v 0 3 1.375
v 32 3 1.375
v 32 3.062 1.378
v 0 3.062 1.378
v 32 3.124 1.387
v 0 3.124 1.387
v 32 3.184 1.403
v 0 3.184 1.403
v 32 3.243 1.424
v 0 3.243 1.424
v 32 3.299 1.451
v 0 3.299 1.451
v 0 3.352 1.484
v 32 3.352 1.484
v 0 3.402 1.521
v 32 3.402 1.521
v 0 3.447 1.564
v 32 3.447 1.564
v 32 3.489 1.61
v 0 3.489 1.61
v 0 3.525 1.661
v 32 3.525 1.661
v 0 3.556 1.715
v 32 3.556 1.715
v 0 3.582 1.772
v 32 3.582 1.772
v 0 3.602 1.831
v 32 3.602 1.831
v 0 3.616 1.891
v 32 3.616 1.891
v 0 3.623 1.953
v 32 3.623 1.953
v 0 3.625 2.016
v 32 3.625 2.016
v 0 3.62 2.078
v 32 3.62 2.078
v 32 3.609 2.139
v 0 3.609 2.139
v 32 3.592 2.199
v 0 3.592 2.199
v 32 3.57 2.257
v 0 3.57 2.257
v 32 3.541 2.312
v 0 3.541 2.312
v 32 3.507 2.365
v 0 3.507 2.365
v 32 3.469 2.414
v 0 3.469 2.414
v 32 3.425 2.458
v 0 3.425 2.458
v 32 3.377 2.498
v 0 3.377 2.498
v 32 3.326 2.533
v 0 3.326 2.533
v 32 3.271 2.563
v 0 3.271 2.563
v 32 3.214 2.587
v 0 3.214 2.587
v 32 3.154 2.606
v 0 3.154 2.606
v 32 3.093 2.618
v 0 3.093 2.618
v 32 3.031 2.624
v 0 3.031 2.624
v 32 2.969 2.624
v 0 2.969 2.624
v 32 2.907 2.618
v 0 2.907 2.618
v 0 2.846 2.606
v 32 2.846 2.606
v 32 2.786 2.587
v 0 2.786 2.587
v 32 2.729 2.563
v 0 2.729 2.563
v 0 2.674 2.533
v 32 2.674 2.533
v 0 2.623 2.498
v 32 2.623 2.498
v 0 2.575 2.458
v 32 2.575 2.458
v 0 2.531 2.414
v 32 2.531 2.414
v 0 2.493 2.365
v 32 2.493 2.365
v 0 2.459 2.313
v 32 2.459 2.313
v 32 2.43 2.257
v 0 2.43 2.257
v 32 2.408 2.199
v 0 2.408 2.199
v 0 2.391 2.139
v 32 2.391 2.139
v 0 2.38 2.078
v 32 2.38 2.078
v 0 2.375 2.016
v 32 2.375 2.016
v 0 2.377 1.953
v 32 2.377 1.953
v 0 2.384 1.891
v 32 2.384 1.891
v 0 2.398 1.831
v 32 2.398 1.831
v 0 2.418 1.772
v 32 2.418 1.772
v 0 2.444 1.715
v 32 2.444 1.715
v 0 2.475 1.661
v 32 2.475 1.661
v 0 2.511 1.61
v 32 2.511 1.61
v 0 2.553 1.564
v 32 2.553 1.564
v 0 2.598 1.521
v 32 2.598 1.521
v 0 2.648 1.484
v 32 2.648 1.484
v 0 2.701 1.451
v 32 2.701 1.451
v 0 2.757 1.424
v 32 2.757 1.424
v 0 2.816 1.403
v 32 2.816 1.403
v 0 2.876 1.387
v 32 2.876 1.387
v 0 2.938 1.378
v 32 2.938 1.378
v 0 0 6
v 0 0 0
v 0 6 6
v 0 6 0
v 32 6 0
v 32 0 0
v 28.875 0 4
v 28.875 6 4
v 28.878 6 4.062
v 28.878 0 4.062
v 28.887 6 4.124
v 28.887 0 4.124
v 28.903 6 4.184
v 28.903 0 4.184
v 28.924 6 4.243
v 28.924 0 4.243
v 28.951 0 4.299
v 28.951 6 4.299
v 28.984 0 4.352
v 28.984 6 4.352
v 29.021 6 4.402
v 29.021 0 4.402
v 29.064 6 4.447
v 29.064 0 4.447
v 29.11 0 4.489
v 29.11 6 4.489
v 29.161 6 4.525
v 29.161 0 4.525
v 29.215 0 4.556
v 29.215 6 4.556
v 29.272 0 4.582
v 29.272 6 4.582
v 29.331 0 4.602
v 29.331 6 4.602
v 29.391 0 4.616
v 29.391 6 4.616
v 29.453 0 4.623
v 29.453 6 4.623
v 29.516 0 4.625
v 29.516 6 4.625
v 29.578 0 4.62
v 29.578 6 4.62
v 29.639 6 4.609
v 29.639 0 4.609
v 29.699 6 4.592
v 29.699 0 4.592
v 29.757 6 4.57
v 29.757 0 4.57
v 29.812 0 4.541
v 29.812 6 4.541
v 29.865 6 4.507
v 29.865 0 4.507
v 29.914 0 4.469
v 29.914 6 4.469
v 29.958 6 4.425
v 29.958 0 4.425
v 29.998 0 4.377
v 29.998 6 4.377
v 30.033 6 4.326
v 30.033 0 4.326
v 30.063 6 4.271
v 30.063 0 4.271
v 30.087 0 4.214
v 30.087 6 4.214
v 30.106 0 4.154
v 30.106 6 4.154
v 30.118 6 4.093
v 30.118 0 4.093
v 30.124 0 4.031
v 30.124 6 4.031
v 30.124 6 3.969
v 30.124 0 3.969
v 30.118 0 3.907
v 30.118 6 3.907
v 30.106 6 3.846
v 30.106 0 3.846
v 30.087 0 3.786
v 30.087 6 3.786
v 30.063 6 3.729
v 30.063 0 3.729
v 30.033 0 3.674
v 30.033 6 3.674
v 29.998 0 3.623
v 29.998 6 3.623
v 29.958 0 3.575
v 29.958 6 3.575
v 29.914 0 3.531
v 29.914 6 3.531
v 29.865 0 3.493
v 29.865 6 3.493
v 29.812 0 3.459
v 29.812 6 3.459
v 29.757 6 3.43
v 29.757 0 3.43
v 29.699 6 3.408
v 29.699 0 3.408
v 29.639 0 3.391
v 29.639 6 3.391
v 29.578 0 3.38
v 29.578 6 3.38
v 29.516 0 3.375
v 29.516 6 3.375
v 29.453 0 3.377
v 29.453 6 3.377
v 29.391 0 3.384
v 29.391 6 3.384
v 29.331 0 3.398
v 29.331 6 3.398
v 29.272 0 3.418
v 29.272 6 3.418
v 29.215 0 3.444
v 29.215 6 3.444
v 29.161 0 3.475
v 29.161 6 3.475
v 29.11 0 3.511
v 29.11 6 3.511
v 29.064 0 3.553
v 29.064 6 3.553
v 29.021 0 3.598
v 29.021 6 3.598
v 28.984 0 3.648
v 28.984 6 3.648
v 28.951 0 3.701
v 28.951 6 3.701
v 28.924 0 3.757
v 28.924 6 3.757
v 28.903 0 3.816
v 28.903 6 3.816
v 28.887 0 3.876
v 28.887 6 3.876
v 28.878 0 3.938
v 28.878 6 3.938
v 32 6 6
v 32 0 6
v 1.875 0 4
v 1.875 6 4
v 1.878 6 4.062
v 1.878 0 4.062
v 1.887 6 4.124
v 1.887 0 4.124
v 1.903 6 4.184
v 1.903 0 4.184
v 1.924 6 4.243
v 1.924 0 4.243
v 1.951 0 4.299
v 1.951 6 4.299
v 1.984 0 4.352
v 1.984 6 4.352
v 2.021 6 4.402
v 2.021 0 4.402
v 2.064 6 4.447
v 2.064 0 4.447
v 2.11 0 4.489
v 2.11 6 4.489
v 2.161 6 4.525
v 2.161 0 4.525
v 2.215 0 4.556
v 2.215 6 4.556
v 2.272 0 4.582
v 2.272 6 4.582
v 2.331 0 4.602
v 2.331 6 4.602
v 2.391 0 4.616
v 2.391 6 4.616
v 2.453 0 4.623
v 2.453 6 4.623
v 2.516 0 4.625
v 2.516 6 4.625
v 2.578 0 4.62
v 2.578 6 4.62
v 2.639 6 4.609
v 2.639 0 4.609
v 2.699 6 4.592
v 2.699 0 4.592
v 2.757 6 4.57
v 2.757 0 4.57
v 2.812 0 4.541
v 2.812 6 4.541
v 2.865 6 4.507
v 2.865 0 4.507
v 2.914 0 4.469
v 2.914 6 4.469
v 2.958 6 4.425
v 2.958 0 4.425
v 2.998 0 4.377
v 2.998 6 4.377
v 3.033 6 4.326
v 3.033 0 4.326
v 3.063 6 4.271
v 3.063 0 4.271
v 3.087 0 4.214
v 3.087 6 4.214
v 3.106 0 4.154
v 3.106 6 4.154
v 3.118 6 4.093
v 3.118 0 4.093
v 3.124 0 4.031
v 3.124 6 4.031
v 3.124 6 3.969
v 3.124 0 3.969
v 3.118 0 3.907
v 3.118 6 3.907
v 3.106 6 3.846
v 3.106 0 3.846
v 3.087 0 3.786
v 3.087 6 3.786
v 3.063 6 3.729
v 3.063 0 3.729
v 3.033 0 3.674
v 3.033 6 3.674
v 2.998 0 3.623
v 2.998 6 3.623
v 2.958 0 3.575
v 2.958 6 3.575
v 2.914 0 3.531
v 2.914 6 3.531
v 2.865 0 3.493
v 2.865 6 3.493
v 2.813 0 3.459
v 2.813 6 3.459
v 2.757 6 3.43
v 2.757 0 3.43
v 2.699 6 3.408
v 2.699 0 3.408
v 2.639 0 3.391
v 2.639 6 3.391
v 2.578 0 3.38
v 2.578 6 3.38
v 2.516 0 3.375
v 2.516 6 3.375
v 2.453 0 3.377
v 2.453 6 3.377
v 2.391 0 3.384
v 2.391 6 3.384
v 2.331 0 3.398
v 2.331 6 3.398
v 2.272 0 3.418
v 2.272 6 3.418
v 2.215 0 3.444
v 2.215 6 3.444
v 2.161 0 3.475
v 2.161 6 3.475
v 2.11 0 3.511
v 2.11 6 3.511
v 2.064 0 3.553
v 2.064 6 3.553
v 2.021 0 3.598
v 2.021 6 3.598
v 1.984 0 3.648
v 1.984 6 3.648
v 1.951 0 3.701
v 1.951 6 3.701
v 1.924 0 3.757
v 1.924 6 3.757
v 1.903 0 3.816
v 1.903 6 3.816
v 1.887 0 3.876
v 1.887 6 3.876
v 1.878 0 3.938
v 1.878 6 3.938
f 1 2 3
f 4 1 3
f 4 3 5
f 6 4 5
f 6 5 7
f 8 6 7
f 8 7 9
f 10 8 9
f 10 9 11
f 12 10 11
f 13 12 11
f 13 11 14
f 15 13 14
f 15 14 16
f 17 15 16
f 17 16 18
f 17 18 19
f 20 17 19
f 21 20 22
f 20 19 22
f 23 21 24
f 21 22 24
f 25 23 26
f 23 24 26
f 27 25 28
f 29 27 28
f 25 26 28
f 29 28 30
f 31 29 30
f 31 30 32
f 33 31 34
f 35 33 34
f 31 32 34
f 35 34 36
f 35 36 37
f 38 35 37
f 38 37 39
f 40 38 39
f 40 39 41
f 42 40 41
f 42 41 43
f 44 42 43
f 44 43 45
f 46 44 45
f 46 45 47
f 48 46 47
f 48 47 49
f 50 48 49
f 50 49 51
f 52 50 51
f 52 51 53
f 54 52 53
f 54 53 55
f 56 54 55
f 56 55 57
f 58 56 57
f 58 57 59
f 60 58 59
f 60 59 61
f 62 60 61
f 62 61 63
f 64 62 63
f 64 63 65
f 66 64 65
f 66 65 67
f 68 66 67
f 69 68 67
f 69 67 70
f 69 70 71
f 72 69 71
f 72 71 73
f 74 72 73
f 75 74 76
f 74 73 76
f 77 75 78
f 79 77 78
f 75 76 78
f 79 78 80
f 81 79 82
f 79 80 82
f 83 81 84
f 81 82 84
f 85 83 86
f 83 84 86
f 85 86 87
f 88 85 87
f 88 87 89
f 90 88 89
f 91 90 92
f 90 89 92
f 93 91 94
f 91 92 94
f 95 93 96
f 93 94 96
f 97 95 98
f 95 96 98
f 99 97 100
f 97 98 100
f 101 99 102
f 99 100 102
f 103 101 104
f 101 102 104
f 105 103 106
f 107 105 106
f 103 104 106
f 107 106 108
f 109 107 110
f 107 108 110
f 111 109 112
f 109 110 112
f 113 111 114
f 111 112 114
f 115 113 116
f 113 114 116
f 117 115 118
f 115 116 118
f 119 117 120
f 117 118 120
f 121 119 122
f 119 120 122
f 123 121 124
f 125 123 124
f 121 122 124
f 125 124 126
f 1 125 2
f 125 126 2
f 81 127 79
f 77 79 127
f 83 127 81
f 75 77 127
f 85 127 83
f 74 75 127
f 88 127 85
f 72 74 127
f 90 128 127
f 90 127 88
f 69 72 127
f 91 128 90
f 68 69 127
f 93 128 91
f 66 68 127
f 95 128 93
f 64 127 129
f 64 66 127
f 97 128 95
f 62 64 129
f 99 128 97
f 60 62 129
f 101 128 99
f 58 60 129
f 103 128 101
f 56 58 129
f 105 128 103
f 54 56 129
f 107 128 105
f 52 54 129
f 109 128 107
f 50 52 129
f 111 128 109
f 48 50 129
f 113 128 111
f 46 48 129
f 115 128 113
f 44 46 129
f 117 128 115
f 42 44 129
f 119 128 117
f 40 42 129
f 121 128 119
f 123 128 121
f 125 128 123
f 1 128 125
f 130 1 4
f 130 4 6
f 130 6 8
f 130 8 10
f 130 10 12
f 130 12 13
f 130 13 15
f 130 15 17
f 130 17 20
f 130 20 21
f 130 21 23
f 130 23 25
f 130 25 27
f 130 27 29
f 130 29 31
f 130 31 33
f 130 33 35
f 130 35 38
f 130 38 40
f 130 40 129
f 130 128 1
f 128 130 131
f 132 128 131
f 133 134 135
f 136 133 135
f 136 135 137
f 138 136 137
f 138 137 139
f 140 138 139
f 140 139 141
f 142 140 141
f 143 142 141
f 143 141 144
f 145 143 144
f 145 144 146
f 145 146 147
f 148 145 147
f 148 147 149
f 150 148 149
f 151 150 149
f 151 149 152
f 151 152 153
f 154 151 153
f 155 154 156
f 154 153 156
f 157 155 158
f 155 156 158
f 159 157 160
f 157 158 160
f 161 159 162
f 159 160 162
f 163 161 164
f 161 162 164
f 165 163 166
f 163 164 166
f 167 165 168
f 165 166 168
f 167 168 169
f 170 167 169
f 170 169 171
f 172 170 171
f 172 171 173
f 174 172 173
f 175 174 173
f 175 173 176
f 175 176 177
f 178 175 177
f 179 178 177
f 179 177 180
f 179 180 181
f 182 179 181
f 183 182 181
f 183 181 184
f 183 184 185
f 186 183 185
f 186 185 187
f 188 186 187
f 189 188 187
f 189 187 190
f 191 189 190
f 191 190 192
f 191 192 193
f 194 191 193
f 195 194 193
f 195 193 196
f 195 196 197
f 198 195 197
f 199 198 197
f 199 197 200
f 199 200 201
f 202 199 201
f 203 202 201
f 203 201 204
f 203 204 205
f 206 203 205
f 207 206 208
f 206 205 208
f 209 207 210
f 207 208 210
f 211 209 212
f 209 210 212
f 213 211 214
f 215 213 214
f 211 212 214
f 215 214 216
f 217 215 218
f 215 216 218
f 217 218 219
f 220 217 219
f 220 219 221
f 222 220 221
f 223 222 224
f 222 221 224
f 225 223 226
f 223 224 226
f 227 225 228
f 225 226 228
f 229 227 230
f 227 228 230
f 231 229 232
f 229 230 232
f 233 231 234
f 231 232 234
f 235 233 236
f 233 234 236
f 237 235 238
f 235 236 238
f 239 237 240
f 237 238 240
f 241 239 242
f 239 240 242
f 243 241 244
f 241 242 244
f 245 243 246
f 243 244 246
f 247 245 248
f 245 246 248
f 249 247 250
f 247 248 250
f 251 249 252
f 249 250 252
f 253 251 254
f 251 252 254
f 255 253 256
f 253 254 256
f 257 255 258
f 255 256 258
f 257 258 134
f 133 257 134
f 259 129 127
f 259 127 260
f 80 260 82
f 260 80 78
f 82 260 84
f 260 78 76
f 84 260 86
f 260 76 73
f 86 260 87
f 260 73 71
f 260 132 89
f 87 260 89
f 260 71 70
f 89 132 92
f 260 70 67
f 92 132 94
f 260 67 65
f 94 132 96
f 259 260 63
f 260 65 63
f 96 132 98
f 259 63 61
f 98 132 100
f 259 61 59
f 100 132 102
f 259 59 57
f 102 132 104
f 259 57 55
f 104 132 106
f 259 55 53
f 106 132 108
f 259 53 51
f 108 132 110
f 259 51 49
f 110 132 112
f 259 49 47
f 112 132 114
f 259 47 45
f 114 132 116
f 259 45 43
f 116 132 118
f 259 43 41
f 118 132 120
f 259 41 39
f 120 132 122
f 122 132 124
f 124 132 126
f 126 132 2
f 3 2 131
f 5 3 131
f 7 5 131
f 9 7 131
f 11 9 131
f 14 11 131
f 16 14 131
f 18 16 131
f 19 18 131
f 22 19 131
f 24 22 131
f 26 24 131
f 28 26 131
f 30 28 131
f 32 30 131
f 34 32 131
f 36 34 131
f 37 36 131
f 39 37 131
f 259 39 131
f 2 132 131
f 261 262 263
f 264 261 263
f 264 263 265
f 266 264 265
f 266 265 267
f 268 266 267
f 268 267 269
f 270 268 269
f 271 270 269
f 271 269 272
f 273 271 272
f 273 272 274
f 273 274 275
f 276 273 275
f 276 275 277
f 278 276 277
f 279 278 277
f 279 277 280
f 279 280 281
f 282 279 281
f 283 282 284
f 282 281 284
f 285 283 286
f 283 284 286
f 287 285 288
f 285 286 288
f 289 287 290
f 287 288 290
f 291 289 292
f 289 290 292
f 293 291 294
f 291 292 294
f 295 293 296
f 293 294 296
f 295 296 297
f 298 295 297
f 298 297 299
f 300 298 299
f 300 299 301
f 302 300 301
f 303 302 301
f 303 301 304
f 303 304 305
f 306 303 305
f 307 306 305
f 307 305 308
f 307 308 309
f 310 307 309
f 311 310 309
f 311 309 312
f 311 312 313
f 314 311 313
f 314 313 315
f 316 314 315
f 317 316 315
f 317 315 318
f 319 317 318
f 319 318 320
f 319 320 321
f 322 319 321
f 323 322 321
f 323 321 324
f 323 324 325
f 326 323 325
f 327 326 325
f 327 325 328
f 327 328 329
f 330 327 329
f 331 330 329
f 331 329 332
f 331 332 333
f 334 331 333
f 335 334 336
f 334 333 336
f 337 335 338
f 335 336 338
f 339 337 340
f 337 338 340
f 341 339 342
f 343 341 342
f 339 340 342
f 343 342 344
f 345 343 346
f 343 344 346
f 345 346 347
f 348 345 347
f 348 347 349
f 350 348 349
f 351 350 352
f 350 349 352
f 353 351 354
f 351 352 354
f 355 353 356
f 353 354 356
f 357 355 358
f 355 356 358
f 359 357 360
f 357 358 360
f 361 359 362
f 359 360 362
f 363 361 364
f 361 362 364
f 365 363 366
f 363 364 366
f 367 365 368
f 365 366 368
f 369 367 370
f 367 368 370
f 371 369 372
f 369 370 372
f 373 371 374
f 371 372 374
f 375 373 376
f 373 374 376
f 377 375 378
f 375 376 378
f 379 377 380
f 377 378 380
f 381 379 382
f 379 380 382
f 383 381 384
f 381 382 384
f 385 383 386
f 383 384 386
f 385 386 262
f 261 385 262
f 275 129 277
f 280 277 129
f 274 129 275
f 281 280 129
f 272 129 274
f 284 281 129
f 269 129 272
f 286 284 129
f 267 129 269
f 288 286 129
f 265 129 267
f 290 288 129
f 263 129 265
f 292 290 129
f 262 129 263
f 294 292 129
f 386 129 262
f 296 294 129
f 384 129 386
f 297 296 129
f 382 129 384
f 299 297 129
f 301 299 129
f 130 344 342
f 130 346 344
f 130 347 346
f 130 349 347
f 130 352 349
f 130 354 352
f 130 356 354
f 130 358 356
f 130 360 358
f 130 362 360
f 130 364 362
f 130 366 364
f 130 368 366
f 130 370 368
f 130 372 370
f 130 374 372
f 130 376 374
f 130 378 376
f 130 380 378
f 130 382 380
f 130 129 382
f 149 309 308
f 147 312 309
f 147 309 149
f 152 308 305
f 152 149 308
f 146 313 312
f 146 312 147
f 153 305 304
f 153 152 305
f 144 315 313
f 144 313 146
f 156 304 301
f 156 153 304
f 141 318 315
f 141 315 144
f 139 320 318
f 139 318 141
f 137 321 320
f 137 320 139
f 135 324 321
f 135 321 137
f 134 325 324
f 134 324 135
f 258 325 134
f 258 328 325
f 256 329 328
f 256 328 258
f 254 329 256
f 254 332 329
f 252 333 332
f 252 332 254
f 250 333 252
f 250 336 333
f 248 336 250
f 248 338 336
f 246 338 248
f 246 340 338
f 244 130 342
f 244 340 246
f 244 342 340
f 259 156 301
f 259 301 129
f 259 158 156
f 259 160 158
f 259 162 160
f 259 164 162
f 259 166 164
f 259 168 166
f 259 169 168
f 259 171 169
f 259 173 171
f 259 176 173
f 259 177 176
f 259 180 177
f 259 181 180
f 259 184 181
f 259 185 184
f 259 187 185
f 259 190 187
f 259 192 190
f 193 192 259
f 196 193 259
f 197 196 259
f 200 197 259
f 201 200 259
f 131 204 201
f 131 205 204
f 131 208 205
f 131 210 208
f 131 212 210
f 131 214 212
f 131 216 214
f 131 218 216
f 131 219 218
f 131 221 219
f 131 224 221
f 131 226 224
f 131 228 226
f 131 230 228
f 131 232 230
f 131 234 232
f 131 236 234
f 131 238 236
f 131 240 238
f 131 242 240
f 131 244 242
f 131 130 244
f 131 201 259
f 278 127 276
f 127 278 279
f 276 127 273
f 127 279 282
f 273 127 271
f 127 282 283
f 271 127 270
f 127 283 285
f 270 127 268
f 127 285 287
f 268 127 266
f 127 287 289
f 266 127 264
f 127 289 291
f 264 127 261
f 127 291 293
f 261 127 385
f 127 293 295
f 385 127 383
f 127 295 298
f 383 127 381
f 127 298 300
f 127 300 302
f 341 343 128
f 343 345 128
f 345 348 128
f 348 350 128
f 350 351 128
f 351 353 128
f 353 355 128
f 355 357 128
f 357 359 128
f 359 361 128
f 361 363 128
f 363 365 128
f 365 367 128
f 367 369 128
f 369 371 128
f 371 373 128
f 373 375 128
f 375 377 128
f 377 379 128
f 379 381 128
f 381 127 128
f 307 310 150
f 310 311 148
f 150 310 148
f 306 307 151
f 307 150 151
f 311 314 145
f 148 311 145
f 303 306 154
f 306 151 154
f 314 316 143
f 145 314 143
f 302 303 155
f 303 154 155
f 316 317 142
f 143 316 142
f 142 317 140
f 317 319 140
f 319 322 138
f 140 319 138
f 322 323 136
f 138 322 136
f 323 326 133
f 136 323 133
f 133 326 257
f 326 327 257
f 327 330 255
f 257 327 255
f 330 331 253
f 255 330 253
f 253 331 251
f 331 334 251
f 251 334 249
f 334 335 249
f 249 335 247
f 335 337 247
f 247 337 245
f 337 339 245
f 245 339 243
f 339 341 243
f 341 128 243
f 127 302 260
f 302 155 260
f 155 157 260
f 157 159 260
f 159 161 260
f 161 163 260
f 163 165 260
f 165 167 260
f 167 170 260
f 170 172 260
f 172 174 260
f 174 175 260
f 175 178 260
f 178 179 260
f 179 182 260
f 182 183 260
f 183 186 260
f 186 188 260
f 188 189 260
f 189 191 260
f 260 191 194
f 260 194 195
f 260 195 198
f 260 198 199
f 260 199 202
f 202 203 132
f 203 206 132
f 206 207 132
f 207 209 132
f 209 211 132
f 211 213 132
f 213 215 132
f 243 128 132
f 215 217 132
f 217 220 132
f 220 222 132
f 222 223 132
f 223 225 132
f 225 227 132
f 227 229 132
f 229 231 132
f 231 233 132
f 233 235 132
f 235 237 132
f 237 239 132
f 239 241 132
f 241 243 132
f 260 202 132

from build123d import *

# Parameters (mm, degrees)
ESQUISSE1_W             = 32
ESQUISSE1_H             = 6
BOSS_EXTRU_1_DEPTH      = 6
ESQUISSE2_R             = 0.625
ENL_V_MAT_EXTRU_1_DEPTH = 34.105890714
ESQUISSE3_R             = 0.625
ENL_V_MAT_EXTRU_2_DEPTH = 34.105890714


with BuildPart() as part:
    # Esquisse1 → Boss.-Extru.1 (new body)
    with BuildSketch(Plane.XY):
        with Locations((16, 3)):
            Rectangle(ESQUISSE1_W, ESQUISSE1_H)
    extrude(amount=BOSS_EXTRU_1_DEPTH)

    # Esquisse2 → Enlèv. mat.-Extru.1 (cut, through all)
    with BuildSketch(Plane(origin=(32, 0, 0), x_dir=(0, 0, -1), z_dir=(1, 0, 0))):
        with Locations((-2, 3)):
            Circle(ESQUISSE2_R)
    extrude(amount=-ENL_V_MAT_EXTRU_1_DEPTH, mode=Mode.SUBTRACT)

    # Esquisse3 → Enlèv. mat.-Extru.2 (cut, through all)
    with BuildSketch(Plane(origin=(0, 6, 0), x_dir=(1, 0, 0), z_dir=(0, 1, 0))):
        with Locations(Location((29.5, -4, 0), (0, 0, 180))):
            Circle(ESQUISSE3_R)
        with Locations(Location((2.5, -4, 0), (0, 0, 180))):
            Circle(ESQUISSE3_R)
    extrude(amount=-ENL_V_MAT_EXTRU_2_DEPTH, mode=Mode.SUBTRACT)


solid = part.part
